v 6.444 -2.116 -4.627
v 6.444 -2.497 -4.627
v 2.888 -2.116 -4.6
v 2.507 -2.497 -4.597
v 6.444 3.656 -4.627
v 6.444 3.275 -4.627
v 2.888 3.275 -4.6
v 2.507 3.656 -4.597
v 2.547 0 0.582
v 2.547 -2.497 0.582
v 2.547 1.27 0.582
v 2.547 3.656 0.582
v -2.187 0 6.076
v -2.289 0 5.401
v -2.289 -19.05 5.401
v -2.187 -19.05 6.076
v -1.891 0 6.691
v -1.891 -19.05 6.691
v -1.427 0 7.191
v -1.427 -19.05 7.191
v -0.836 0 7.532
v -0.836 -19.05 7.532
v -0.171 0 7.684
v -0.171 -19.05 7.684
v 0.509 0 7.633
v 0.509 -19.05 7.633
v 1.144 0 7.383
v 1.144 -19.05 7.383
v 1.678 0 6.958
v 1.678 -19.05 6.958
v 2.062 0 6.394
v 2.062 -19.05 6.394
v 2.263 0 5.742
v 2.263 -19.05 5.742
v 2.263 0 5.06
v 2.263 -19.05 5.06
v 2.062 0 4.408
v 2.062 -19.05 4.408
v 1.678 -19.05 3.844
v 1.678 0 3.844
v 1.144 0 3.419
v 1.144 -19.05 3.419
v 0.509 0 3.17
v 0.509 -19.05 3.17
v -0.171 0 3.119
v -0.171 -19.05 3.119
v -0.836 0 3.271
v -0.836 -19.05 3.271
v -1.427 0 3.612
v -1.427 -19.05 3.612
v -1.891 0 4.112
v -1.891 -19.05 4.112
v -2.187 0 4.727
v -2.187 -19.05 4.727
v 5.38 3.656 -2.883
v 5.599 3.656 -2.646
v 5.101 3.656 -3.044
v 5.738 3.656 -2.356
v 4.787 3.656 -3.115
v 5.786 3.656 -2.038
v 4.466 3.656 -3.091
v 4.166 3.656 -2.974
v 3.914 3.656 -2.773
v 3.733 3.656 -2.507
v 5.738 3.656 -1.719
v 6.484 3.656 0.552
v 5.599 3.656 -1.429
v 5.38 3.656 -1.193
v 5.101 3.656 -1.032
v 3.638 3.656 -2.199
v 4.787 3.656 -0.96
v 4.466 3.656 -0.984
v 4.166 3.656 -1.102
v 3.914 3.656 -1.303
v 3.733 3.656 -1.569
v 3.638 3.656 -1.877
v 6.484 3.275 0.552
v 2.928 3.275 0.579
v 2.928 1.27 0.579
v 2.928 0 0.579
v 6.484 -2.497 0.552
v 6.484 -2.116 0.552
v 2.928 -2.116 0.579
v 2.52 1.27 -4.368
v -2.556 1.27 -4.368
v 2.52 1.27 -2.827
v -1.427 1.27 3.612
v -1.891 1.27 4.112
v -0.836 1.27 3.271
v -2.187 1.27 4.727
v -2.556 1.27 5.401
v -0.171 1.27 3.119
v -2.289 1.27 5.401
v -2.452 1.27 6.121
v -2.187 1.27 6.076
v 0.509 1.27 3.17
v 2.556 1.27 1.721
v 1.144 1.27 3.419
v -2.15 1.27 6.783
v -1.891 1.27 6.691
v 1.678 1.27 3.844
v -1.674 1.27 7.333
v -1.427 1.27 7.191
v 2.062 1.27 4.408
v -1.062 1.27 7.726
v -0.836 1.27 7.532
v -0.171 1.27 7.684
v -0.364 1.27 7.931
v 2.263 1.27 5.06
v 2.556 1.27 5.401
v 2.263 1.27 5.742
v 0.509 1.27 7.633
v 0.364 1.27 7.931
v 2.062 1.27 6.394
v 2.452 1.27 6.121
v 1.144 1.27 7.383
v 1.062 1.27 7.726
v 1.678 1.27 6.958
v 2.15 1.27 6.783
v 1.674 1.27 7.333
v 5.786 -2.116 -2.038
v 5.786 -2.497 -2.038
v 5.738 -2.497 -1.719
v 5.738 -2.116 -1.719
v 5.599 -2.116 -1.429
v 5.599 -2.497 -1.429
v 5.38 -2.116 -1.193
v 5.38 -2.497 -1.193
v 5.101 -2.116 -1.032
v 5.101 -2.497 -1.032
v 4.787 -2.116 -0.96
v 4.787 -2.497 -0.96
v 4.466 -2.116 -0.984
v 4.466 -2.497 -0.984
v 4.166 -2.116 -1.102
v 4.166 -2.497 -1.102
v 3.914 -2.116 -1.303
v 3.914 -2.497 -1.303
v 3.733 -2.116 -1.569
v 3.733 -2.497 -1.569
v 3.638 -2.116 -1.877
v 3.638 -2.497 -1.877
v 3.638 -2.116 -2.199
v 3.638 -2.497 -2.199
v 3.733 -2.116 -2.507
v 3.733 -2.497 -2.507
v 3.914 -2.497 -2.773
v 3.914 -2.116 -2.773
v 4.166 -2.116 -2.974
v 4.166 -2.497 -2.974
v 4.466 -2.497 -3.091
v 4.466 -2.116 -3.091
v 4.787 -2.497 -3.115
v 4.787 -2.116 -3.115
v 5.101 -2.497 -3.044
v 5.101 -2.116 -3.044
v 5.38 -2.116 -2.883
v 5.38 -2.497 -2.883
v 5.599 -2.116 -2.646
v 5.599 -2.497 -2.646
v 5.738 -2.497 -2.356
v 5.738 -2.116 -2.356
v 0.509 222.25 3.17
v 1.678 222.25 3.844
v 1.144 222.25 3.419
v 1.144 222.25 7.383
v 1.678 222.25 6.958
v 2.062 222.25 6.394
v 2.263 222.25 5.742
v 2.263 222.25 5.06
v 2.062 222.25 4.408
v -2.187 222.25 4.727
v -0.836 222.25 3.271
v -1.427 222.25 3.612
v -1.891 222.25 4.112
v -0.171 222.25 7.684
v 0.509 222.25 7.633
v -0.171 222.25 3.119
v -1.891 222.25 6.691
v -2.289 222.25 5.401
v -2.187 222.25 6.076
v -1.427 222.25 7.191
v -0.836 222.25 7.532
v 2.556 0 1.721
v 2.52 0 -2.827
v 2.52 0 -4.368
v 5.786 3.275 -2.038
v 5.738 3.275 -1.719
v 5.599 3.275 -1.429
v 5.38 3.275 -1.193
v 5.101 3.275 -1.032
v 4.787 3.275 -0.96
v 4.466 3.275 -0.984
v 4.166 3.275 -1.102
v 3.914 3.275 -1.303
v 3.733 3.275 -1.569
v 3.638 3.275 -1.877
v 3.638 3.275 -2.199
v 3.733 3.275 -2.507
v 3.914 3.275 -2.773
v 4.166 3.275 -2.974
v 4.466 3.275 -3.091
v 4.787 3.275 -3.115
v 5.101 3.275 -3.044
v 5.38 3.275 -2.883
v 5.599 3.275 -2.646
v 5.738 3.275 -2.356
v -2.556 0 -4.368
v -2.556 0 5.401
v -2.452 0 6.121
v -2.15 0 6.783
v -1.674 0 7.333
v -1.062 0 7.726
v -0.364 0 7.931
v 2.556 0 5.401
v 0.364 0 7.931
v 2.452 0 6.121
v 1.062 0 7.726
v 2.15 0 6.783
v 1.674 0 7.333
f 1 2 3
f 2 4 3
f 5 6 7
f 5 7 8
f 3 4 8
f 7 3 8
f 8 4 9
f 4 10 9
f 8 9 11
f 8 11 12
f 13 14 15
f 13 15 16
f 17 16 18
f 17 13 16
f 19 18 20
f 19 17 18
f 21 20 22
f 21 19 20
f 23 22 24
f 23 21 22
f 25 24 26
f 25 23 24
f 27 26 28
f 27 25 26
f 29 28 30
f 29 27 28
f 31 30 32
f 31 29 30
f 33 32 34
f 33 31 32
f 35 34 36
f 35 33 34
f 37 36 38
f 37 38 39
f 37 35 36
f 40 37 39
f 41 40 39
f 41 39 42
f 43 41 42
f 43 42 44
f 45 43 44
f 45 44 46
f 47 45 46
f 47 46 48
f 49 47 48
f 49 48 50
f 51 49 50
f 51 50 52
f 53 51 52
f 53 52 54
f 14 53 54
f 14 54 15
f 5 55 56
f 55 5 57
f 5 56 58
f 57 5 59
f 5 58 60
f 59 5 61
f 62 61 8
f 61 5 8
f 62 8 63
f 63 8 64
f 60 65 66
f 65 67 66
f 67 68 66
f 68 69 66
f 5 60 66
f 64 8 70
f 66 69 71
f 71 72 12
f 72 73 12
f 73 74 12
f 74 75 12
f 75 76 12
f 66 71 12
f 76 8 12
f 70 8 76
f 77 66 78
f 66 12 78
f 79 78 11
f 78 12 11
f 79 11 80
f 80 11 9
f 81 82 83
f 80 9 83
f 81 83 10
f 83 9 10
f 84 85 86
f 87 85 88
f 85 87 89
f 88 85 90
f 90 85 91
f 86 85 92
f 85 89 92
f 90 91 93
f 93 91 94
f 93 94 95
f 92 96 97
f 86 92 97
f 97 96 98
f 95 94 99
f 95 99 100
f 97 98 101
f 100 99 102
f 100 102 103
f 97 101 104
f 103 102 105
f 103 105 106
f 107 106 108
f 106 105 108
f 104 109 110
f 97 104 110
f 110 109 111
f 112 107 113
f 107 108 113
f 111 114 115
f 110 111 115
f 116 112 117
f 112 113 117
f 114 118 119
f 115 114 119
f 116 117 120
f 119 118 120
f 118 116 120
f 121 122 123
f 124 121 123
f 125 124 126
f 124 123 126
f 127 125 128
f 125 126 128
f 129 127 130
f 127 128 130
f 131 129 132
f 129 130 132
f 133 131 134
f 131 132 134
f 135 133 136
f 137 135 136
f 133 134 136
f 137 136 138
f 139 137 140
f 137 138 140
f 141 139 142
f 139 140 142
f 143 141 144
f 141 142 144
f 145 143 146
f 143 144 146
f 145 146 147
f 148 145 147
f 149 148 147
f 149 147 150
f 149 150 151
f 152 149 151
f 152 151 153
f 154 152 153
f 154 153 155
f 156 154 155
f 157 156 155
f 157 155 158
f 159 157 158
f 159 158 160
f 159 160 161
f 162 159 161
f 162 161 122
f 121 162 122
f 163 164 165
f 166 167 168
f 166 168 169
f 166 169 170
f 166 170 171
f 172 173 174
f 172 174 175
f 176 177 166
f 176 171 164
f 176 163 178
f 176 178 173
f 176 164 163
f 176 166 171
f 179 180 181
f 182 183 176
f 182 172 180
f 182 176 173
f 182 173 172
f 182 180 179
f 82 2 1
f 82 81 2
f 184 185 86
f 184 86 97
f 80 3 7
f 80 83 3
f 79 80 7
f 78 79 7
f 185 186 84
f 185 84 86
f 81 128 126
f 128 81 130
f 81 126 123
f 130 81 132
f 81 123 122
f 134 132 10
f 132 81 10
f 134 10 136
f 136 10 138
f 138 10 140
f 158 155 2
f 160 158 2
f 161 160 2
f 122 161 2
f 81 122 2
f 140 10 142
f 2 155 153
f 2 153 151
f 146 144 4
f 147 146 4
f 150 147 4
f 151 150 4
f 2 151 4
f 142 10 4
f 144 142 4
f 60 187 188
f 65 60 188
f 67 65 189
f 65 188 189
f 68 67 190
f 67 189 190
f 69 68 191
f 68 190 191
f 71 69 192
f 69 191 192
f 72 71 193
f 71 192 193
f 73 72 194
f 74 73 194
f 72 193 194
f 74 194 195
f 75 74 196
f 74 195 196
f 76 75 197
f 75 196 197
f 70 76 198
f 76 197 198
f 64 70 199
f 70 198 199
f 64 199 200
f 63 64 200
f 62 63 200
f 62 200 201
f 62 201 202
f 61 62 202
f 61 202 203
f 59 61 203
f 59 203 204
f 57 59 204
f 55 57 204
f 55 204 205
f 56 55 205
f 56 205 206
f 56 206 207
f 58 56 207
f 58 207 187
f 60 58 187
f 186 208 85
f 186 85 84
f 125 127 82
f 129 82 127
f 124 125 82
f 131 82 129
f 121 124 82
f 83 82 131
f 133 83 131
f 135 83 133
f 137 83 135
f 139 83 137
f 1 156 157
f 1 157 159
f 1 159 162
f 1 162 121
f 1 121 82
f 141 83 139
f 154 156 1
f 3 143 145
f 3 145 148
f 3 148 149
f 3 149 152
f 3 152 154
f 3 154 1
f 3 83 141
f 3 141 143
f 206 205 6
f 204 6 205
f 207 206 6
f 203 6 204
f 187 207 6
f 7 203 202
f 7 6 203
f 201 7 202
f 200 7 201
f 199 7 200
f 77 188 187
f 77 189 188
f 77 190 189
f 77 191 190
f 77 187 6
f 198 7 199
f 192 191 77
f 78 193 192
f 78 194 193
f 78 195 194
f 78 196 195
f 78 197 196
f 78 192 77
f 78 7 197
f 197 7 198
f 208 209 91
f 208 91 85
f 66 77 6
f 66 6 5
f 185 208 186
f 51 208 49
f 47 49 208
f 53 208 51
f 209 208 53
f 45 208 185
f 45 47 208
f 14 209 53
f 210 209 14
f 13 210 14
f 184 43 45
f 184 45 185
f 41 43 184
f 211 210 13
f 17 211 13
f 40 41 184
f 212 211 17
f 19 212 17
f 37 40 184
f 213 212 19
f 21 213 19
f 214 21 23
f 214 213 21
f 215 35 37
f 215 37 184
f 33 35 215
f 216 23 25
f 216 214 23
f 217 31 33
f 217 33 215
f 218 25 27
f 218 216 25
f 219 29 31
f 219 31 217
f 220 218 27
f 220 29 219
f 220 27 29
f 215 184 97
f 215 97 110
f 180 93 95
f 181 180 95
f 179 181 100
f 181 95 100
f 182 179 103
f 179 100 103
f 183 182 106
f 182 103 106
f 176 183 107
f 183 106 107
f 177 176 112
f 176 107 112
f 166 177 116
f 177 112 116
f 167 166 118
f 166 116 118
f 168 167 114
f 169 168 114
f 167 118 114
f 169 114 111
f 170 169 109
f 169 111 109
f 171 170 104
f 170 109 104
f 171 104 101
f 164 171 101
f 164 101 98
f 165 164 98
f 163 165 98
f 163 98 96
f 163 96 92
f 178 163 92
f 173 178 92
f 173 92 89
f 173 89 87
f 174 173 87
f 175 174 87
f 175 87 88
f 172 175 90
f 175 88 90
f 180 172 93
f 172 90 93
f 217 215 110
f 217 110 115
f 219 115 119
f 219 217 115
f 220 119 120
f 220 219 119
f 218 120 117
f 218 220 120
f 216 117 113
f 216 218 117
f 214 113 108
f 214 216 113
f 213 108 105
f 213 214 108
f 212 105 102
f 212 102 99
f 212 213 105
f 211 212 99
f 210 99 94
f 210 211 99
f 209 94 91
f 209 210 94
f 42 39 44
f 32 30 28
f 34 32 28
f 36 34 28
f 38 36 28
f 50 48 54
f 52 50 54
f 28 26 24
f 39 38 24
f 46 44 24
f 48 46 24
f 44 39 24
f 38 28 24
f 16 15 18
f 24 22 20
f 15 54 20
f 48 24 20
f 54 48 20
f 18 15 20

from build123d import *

# Parameters (mm, degrees)
F1_DEPTH      = 1.27
F2_R          = 2.2887754184
F3_DEPTH      = 220.98
F3_DEPTH_BACK = 20.32
F4_W          = 1.27
F4_H          = 3.4091206923
F5_DEPTH      = 3.937
F6_T          = -0.381
F7_R          = 1.080450049
F8_DEPTH      = 11.176


# Not quite as in the source:
# - a feature names something its author has since deleted; it is built from what else it names


with BuildPart() as f1:
    # F0 (on Front) → F1 (new body)
    with BuildSketch(Plane.XZ):
        with BuildLine():
            ThreePointArc((-2.5559609307, 5.4012401961), (0, 2.8452792654), (2.5559609307, 5.4012401961))
            ThreePointArc((2.5559609307, 5.4012401961), (0, 7.9572011268), (-2.5559609307, 5.4012401961))
        make_face()
        with BuildLine():
            Line((2.5559609307, 1.721014436), (2.5559609307, 5.4012401961))
            ThreePointArc((2.5559609307, 5.4012401961), (0, 2.8452792654), (-2.5559609307, 5.4012401961))
            Line((-2.5559609307, 5.4012401961), (-2.5559609307, 4.3758706689))
            Line((-2.5559609307, 4.3758706689), (-2.5559609307, -2.8266729787))
            Line((-2.5559609307, -2.8266729787), (-2.5559609307, -4.3681138195))
            Line((-2.5559609307, -4.3681138195), (2.5204877513, -4.3681138195))
            Line((2.5204877513, -4.3681138195), (2.5204877513, -2.8266729787))
            Line((2.5204877513, -2.8266729787), (2.5559609307, 1.721014436))
        make_face()
    extrude(amount=-F1_DEPTH)

    # F2 (on face) → F3 (join, two sides)
    with BuildSketch(Plane(origin=(0, 1.27, 0), x_dir=(-1, 0, 0), z_dir=(0, 1, 0))) as f3_sk:
        with Locations((0, 5.4012401961)):
            Circle(F2_R)
    extrude(amount=F3_DEPTH)
    extrude(f3_sk.sketch, amount=-F3_DEPTH_BACK)


with BuildPart() as f5:
    # F4 (on face) → F5 (new body)
    with BuildSketch(Plane(origin=(2.5423818682, 0, -0.0198312593), x_dir=(0, 1, 0), z_dir=(0.9999695793, 0, -0.0078000304))):
        Polygon((-2.497356755, -4.576918826), (3.6564493494, -4.576918826), (3.6564493494, 0.6021935842), (1.27, 0.6021935842), (1.27, -2.8069271081), (0, -2.8069271081), (0, 0.6021935842), (-2.497356755, 0.6021935842), align=None)
        with Locations((0.635, -1.102366762)):
            Rectangle(F4_W, F4_H)
    extrude(amount=F5_DEPTH)

    # F6
    f6_openings = [f5.faces().sort_by_distance(p)[0] for p in [
        (6.463761, 0.579546, -2.037842),
        (4.515519, 0.579546, 0.56699),
        (4.475122, 0.579546, -4.611965),
    ]]
    offset(amount=F6_T, openings=f6_openings)

    # F7 (on face) → F8 (cut)
    with BuildSketch(Plane.XZ.offset(2.497356755)):
        with Locations((4.7060133182, -2.0378421431)):
            Circle(F7_R)
    extrude(amount=-F8_DEPTH, mode=Mode.SUBTRACT)


solid = Compound([f1.part, f5.part])
